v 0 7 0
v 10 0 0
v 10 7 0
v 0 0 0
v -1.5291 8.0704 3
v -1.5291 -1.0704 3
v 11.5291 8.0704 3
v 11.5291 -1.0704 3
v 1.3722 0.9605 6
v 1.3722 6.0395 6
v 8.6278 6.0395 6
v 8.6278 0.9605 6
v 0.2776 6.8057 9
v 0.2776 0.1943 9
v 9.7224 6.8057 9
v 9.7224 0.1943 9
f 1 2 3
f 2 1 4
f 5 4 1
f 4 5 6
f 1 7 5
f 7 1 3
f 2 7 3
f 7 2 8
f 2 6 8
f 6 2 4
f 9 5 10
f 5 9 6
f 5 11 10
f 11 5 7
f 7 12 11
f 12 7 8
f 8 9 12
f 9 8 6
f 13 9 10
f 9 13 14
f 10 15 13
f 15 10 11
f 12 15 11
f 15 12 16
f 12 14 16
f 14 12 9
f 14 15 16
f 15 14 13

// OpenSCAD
//StackedCubes Example

x = 10;
y = 7;
z = 3;

function randno(f) = f * (rands(-0.51,0.51,1)[0]); 

function shift(a,f) = ((f*a) - a) / 2.0;

function CubeLayer(n, f=1.0) = [
  [  0 - shift(x,f),  0 - shift(y,f),  n*z ],
  [  0 - shift(x,f),  y + shift(y,f),  n*z ],
  [  x + shift(x,f),  y + shift(y,f),  n*z ],
  [  x + shift(x,f),  0 - shift(y,f),  n*z ]];
  
//No top
function CubeFacesB(n) = [
  [n+0,n+1,n+2,n+3]]; // bottom
  
//No bottom or top
function CubeFacesL(n) = [
  [n+4,n+5,n+1,n+0],  // front
  [n+5,n+6,n+2,n+1],  // right
  [n+6,n+7,n+3,n+2],  // back
  [n+7,n+4,n+0,n+3]]; // left

//No bottom
function CubeFacesT(n) = [
  [n+7,n+6,n+5,n+4]]; // Top

CubePoints = concat(
    CubeLayer(0), //Bottom
    CubeLayer(1, 1 + randno(1)),
    CubeLayer(2, 1 + randno(1)),
    CubeLayer(3, 1 + randno(1))); //Top

CubeFaces = concat(
    CubeFacesB(0),
    CubeFacesL(0),
    CubeFacesL(1*4),
    CubeFacesL(2*4),
    CubeFacesT(2*4));

//echo(CubePoints);
//echo(CubeFaces);

polyhedron( CubePoints, CubeFaces );
